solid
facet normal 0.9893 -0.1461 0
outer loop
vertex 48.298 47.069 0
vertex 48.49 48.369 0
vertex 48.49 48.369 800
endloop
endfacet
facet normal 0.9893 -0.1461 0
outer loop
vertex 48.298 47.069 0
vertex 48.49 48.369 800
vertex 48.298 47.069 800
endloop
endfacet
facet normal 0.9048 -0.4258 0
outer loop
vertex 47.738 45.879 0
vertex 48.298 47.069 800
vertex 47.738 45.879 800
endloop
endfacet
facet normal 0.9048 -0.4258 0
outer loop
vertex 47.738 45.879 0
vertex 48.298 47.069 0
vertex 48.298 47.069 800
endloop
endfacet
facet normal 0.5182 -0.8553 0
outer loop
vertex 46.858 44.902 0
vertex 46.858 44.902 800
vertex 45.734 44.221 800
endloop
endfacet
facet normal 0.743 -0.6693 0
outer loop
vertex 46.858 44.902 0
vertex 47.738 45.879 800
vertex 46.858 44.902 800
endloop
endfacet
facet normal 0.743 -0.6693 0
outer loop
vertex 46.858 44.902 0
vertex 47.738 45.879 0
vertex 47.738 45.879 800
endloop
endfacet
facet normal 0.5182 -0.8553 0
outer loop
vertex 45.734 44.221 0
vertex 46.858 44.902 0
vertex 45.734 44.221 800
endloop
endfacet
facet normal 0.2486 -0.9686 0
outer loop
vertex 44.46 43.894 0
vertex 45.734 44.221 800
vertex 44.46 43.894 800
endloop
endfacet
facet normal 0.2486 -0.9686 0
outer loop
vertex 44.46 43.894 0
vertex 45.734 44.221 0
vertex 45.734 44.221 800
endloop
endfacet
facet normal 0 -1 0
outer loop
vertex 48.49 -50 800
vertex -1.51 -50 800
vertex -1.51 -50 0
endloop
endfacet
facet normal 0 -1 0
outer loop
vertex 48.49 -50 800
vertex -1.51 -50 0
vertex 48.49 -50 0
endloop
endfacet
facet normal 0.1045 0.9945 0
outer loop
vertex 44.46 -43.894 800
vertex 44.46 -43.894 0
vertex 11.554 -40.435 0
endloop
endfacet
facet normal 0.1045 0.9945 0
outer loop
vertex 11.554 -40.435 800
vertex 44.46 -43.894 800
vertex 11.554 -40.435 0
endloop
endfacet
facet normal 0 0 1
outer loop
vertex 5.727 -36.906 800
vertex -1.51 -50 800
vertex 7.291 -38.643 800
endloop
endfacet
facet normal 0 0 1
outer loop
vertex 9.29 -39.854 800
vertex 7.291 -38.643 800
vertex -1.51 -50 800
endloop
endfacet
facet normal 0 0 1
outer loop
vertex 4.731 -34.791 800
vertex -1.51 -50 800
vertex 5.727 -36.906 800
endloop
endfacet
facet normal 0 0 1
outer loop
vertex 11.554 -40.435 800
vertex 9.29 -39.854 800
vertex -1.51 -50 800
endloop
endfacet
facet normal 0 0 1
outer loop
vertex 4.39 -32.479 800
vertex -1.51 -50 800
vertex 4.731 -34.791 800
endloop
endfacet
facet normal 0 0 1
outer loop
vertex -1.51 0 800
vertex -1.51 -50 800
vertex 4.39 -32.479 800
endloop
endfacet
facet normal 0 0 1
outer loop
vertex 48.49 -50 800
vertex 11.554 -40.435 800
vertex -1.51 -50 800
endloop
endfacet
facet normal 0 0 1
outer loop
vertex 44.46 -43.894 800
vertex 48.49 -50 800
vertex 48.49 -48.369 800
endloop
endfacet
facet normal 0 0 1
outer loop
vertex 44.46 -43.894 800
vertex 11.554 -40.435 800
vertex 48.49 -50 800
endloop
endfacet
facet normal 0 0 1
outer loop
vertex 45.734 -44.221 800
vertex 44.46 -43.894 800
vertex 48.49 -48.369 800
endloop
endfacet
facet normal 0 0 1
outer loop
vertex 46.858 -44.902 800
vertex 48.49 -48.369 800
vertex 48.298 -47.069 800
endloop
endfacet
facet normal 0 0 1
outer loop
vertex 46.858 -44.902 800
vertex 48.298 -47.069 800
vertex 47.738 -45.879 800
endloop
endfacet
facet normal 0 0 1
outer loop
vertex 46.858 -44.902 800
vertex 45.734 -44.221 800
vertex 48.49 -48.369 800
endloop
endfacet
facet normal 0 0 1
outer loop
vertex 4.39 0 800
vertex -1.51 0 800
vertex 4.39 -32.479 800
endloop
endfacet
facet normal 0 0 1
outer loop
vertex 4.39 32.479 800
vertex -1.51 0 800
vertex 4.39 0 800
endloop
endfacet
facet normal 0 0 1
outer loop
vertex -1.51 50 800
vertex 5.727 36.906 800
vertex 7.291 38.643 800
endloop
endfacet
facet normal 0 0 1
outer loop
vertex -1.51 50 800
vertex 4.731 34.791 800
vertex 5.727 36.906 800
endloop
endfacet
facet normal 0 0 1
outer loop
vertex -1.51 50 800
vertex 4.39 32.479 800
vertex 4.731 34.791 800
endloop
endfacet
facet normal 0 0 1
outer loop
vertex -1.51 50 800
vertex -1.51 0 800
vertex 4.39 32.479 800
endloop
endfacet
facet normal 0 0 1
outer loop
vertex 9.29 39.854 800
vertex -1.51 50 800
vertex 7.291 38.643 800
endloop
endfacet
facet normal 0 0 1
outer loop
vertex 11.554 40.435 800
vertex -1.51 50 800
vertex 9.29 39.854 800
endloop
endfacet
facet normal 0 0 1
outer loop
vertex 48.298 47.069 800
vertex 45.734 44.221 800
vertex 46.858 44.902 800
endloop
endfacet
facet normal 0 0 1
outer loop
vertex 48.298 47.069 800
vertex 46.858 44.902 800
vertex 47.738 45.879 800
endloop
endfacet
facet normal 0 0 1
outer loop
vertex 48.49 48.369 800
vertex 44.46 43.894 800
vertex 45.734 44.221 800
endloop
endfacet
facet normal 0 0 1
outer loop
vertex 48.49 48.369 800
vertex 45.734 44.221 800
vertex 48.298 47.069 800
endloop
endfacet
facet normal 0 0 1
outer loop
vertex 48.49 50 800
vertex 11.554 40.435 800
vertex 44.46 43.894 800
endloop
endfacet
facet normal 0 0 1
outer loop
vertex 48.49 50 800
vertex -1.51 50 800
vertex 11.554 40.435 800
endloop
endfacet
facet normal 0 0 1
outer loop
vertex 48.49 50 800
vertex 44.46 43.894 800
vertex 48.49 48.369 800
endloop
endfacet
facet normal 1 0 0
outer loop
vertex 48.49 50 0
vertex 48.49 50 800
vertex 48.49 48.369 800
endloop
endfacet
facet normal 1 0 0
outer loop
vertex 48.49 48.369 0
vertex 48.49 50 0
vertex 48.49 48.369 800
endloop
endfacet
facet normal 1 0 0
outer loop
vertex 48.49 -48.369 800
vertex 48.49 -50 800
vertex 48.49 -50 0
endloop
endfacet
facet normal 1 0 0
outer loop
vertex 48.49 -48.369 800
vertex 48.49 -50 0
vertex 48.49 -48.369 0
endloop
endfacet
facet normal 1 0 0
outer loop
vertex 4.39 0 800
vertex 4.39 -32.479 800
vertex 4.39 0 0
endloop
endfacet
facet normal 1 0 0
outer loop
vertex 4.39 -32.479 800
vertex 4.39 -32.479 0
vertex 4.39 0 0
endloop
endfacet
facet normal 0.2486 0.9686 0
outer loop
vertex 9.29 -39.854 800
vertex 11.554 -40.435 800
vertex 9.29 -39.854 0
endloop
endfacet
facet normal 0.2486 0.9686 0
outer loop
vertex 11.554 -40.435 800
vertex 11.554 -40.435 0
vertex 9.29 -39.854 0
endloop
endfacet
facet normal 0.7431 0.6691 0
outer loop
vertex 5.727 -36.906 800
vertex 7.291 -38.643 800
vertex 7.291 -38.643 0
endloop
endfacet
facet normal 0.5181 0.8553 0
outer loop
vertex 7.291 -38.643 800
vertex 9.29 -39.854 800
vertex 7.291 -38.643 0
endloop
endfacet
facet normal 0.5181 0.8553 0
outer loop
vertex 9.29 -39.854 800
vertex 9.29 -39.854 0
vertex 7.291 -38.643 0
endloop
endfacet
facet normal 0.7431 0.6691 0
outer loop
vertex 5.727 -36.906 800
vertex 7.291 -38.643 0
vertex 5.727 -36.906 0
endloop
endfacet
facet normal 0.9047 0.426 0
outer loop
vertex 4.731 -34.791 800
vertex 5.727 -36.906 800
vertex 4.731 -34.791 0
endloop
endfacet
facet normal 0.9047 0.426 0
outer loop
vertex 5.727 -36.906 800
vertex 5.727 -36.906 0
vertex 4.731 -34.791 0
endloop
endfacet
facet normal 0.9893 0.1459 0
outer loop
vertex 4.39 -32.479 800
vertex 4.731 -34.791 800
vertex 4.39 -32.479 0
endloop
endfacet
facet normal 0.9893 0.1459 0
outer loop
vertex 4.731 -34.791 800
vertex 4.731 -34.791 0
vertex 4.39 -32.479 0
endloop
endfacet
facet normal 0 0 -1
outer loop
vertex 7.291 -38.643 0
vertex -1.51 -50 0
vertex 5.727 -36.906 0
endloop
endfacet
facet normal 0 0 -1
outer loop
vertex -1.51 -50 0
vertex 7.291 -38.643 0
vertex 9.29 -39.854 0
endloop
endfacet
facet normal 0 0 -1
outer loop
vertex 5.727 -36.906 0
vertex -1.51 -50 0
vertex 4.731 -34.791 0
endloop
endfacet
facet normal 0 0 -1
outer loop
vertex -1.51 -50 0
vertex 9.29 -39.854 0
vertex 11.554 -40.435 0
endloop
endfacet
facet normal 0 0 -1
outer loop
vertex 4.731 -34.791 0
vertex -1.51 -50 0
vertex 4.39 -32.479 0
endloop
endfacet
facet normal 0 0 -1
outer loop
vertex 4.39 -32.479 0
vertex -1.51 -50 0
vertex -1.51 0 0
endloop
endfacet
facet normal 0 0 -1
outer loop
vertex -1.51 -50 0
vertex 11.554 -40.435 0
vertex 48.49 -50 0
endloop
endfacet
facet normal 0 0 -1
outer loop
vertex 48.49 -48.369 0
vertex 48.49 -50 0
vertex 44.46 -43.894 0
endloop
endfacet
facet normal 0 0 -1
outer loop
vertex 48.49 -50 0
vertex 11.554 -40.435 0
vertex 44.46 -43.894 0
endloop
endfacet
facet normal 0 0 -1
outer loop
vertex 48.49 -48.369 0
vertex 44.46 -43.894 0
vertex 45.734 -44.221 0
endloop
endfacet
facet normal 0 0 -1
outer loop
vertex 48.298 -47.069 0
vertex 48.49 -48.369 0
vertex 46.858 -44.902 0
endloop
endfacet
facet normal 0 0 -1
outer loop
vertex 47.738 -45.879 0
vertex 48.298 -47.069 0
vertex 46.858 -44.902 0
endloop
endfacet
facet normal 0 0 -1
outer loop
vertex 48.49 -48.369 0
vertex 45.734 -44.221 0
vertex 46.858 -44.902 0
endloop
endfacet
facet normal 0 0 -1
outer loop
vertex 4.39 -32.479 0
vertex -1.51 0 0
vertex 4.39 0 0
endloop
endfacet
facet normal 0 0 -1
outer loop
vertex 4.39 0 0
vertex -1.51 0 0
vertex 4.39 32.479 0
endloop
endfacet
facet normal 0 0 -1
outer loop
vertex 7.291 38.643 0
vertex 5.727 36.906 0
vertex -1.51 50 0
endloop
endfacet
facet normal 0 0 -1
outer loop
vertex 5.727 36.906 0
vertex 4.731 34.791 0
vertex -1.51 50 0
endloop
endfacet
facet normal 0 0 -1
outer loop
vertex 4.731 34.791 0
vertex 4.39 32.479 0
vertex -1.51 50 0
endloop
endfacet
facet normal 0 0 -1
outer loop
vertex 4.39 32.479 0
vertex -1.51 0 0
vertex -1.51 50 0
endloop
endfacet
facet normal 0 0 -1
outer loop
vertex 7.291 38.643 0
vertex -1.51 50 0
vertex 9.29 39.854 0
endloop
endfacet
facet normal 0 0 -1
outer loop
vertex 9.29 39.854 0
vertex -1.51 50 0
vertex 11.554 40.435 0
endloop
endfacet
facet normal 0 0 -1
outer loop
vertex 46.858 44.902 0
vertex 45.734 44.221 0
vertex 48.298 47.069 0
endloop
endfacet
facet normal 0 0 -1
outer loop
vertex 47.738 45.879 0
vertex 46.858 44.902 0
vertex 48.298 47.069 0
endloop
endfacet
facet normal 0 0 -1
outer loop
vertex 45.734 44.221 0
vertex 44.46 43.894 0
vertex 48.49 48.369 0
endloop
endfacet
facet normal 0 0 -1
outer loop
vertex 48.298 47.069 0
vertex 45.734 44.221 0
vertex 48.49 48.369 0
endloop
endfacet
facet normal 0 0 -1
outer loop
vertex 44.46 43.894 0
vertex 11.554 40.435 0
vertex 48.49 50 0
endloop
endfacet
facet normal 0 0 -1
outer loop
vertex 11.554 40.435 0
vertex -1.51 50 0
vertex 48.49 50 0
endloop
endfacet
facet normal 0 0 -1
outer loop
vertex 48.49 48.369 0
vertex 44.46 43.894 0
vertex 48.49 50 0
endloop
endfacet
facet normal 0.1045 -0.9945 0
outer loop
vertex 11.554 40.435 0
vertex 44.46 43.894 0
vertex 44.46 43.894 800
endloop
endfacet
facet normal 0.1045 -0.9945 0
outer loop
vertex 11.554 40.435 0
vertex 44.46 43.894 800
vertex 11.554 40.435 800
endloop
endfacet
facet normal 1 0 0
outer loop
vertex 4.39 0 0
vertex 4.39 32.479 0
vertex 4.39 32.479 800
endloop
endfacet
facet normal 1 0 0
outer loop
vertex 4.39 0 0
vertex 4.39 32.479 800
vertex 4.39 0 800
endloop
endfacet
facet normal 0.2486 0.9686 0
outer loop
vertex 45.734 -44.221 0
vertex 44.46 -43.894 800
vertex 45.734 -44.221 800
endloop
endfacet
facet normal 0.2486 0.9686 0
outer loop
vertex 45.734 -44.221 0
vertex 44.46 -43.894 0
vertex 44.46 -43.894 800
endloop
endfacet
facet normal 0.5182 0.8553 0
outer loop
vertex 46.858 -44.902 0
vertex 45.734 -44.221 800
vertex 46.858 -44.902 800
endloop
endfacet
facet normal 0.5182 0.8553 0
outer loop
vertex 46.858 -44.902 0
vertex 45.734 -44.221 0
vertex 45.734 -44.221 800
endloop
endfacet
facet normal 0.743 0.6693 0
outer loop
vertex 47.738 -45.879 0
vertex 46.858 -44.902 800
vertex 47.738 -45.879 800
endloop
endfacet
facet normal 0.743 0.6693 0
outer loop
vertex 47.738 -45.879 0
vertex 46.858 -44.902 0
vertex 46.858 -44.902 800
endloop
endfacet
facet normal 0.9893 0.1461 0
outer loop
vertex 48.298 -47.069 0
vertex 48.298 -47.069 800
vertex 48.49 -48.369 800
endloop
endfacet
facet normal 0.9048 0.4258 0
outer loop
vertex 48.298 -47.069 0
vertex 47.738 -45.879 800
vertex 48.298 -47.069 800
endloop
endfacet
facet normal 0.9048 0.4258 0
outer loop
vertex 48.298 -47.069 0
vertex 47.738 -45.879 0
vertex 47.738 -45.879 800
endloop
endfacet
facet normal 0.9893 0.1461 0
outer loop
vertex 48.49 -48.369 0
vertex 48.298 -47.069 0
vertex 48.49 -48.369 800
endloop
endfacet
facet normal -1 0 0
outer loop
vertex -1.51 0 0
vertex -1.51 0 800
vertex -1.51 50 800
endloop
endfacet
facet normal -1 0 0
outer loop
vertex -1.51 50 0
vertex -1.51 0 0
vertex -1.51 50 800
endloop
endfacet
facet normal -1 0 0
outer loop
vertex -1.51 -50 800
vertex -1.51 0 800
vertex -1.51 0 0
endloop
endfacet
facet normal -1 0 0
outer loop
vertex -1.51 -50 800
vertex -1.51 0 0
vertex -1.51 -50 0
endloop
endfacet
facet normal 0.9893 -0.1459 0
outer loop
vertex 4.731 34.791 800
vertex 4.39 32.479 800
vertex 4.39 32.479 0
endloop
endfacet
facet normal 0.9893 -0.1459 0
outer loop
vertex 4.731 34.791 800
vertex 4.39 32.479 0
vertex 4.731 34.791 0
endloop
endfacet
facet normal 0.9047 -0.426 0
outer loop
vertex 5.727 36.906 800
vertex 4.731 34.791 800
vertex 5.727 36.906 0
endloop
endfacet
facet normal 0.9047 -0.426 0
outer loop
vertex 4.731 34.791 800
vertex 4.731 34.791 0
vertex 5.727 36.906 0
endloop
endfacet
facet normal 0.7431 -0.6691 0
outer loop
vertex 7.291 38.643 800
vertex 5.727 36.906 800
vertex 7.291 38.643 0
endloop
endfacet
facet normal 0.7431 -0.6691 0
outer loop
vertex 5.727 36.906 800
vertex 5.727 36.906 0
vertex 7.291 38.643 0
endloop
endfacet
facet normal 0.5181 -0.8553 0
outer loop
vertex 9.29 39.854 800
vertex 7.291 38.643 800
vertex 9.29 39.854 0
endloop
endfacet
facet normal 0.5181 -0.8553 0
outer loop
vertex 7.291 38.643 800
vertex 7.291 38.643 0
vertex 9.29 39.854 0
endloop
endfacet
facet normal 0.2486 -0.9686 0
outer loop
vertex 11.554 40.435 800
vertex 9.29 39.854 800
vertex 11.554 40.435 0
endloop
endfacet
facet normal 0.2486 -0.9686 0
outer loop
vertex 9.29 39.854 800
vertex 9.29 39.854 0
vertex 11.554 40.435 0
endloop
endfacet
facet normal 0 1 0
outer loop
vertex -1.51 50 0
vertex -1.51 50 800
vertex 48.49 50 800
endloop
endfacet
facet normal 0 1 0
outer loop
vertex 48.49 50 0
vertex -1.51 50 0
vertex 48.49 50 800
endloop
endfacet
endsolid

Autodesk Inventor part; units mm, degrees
ref_plane "YZ Plane" through (0, 0, 0) normal (1, 0, 0) x (0, 1, 0)
ref_plane "Start Plane" through (0, 0, 0) normal (0, 0, 1) x (1, 0, 0)
ref_plane "End Plane" through (0, 0, 800) normal (0, 0, 1) x (1, 0, 0)
sketch "Sketch" plane through (0, 0, 0) normal (0, 0, 1) x (1, 0, 0)
  line L0 (-1.51, 0) -> (-1.51, 50)
  line L1 (-1.51, 50) -> (48.49, 50)
  line L2 (48.49, 50) -> (48.49, 48.3694)
  line L3 (44.4604, 43.894) -> (11.5538, 40.4354)
  line L4 (4.39, 32.4792) -> (4.39, 0)
  line L5 (4.39, 0) -> (-1.51, 0) construction
  line L6 (26.44, 50) -> (26.44, 42) construction
  line L7 (48.49, 44.3175) -> (48.49, 42) construction
  line L8 (48.49, 42) -> (26.44, 42) construction
  line L9 (0, 15) -> (0, -27) construction
  line L10 (-5.539, 0) -> (16.0067, 0) construction
  line L11 (-1.51, 0) -> (-1.51, -50)
  line L12 (-1.51, -50) -> (48.49, -50)
  line L13 (48.49, -50) -> (48.49, -48.3694)
  line L14 (44.4604, -43.894) -> (11.5538, -40.4354)
  line L15 (4.39, -32.4792) -> (4.39, 0)
  arc A0 (11.5538, 40.4354) -> (4.39, 32.4792) centre (12.39, 32.4792) ccw
  arc A1 (4.39, -32.4792) -> (11.5538, -40.4354) centre (12.39, -32.4792) ccw
  arc A2 (44.4604, 43.894) -> (48.49, 48.3694) centre (43.99, 48.3694) ccw
  arc A3 (48.49, -48.3694) -> (44.4604, -43.894) centre (43.99, -48.3694) ccw
  line L16 (0, 70) -> (0, -70) construction
  line L17 (-16.5166, 0) -> (60.3266, 0) construction
  point P0 (4.39, 39.6825)
  point P1 (48.49, -44.3175)
  point P2 (4.39, -39.6825)
  point P3 (26.44, -50)
  point P4 (26.44, -42)
  dimension "d0" = 5.9
  dimension "d1" = 50
  dimension "d2" = 50
  dimension "d3" = 8
  dimension "d4" = 22.05
  dimension "d5" = 2.3175
  dimension "d23" = 8
  dimension "d24" = 4.5
  dimension "d25" = 1.51
extrude "Body" add sketch "Sketch" along normal up to surface (800 mm away) from surface at 0
sketch "Sketch3" plane through (0, 0, 0) normal (0, 0, 1) x (1, 0, 0)
  line L0 (0, 0) -> (10, 0)
ref_plane "Work Plane3" through (0, 0, 0) normal (0, -1, 0) x (1, 0, 0)
sketch "Sketch4" plane through (0, 0, 0) normal (0, -1, 0) x (1, 0, 0)
  line L0 (-2, 0) -> (12, 0)
  line L1 (-2, 800) -> (12, 800)
  dimension "d29" = 800
equation "\"d0\" = G_T"
equation "\"d1\" = 0.5 * G_H"
equation "\"d2\" = G_W"
equation "\"d3\" = G_T1"
equation "\"d4\" = G_C"
equation "\"d23\" = G_IR"
equation "\"d24\" = G_ER"
equation "\"d25\" = ex"
equation "\"d6\" = G_L"
equation "\"G_W\" = 50"
equation "\"G_H\" = 100"
equation "\"G_T\" = 5.9"
equation "\"G_T1\" = 8"
equation "\"G_NG\" = 0.105104"
equation "\"G_ER\" = 4.5"
equation "\"G_IR\" = 8"
equation "\"G_C\" = 22.05"
equation "\"G_L\" = d29"
equation "\"ex\" = 1.51"
equation "\"G_OFFSET_START\" = 0"
equation "\"G_OFFSET_END\" = 0"
properties part number "ISO 657_11 CH 100 x 10 1744276061340" material "Steel, Mild"
